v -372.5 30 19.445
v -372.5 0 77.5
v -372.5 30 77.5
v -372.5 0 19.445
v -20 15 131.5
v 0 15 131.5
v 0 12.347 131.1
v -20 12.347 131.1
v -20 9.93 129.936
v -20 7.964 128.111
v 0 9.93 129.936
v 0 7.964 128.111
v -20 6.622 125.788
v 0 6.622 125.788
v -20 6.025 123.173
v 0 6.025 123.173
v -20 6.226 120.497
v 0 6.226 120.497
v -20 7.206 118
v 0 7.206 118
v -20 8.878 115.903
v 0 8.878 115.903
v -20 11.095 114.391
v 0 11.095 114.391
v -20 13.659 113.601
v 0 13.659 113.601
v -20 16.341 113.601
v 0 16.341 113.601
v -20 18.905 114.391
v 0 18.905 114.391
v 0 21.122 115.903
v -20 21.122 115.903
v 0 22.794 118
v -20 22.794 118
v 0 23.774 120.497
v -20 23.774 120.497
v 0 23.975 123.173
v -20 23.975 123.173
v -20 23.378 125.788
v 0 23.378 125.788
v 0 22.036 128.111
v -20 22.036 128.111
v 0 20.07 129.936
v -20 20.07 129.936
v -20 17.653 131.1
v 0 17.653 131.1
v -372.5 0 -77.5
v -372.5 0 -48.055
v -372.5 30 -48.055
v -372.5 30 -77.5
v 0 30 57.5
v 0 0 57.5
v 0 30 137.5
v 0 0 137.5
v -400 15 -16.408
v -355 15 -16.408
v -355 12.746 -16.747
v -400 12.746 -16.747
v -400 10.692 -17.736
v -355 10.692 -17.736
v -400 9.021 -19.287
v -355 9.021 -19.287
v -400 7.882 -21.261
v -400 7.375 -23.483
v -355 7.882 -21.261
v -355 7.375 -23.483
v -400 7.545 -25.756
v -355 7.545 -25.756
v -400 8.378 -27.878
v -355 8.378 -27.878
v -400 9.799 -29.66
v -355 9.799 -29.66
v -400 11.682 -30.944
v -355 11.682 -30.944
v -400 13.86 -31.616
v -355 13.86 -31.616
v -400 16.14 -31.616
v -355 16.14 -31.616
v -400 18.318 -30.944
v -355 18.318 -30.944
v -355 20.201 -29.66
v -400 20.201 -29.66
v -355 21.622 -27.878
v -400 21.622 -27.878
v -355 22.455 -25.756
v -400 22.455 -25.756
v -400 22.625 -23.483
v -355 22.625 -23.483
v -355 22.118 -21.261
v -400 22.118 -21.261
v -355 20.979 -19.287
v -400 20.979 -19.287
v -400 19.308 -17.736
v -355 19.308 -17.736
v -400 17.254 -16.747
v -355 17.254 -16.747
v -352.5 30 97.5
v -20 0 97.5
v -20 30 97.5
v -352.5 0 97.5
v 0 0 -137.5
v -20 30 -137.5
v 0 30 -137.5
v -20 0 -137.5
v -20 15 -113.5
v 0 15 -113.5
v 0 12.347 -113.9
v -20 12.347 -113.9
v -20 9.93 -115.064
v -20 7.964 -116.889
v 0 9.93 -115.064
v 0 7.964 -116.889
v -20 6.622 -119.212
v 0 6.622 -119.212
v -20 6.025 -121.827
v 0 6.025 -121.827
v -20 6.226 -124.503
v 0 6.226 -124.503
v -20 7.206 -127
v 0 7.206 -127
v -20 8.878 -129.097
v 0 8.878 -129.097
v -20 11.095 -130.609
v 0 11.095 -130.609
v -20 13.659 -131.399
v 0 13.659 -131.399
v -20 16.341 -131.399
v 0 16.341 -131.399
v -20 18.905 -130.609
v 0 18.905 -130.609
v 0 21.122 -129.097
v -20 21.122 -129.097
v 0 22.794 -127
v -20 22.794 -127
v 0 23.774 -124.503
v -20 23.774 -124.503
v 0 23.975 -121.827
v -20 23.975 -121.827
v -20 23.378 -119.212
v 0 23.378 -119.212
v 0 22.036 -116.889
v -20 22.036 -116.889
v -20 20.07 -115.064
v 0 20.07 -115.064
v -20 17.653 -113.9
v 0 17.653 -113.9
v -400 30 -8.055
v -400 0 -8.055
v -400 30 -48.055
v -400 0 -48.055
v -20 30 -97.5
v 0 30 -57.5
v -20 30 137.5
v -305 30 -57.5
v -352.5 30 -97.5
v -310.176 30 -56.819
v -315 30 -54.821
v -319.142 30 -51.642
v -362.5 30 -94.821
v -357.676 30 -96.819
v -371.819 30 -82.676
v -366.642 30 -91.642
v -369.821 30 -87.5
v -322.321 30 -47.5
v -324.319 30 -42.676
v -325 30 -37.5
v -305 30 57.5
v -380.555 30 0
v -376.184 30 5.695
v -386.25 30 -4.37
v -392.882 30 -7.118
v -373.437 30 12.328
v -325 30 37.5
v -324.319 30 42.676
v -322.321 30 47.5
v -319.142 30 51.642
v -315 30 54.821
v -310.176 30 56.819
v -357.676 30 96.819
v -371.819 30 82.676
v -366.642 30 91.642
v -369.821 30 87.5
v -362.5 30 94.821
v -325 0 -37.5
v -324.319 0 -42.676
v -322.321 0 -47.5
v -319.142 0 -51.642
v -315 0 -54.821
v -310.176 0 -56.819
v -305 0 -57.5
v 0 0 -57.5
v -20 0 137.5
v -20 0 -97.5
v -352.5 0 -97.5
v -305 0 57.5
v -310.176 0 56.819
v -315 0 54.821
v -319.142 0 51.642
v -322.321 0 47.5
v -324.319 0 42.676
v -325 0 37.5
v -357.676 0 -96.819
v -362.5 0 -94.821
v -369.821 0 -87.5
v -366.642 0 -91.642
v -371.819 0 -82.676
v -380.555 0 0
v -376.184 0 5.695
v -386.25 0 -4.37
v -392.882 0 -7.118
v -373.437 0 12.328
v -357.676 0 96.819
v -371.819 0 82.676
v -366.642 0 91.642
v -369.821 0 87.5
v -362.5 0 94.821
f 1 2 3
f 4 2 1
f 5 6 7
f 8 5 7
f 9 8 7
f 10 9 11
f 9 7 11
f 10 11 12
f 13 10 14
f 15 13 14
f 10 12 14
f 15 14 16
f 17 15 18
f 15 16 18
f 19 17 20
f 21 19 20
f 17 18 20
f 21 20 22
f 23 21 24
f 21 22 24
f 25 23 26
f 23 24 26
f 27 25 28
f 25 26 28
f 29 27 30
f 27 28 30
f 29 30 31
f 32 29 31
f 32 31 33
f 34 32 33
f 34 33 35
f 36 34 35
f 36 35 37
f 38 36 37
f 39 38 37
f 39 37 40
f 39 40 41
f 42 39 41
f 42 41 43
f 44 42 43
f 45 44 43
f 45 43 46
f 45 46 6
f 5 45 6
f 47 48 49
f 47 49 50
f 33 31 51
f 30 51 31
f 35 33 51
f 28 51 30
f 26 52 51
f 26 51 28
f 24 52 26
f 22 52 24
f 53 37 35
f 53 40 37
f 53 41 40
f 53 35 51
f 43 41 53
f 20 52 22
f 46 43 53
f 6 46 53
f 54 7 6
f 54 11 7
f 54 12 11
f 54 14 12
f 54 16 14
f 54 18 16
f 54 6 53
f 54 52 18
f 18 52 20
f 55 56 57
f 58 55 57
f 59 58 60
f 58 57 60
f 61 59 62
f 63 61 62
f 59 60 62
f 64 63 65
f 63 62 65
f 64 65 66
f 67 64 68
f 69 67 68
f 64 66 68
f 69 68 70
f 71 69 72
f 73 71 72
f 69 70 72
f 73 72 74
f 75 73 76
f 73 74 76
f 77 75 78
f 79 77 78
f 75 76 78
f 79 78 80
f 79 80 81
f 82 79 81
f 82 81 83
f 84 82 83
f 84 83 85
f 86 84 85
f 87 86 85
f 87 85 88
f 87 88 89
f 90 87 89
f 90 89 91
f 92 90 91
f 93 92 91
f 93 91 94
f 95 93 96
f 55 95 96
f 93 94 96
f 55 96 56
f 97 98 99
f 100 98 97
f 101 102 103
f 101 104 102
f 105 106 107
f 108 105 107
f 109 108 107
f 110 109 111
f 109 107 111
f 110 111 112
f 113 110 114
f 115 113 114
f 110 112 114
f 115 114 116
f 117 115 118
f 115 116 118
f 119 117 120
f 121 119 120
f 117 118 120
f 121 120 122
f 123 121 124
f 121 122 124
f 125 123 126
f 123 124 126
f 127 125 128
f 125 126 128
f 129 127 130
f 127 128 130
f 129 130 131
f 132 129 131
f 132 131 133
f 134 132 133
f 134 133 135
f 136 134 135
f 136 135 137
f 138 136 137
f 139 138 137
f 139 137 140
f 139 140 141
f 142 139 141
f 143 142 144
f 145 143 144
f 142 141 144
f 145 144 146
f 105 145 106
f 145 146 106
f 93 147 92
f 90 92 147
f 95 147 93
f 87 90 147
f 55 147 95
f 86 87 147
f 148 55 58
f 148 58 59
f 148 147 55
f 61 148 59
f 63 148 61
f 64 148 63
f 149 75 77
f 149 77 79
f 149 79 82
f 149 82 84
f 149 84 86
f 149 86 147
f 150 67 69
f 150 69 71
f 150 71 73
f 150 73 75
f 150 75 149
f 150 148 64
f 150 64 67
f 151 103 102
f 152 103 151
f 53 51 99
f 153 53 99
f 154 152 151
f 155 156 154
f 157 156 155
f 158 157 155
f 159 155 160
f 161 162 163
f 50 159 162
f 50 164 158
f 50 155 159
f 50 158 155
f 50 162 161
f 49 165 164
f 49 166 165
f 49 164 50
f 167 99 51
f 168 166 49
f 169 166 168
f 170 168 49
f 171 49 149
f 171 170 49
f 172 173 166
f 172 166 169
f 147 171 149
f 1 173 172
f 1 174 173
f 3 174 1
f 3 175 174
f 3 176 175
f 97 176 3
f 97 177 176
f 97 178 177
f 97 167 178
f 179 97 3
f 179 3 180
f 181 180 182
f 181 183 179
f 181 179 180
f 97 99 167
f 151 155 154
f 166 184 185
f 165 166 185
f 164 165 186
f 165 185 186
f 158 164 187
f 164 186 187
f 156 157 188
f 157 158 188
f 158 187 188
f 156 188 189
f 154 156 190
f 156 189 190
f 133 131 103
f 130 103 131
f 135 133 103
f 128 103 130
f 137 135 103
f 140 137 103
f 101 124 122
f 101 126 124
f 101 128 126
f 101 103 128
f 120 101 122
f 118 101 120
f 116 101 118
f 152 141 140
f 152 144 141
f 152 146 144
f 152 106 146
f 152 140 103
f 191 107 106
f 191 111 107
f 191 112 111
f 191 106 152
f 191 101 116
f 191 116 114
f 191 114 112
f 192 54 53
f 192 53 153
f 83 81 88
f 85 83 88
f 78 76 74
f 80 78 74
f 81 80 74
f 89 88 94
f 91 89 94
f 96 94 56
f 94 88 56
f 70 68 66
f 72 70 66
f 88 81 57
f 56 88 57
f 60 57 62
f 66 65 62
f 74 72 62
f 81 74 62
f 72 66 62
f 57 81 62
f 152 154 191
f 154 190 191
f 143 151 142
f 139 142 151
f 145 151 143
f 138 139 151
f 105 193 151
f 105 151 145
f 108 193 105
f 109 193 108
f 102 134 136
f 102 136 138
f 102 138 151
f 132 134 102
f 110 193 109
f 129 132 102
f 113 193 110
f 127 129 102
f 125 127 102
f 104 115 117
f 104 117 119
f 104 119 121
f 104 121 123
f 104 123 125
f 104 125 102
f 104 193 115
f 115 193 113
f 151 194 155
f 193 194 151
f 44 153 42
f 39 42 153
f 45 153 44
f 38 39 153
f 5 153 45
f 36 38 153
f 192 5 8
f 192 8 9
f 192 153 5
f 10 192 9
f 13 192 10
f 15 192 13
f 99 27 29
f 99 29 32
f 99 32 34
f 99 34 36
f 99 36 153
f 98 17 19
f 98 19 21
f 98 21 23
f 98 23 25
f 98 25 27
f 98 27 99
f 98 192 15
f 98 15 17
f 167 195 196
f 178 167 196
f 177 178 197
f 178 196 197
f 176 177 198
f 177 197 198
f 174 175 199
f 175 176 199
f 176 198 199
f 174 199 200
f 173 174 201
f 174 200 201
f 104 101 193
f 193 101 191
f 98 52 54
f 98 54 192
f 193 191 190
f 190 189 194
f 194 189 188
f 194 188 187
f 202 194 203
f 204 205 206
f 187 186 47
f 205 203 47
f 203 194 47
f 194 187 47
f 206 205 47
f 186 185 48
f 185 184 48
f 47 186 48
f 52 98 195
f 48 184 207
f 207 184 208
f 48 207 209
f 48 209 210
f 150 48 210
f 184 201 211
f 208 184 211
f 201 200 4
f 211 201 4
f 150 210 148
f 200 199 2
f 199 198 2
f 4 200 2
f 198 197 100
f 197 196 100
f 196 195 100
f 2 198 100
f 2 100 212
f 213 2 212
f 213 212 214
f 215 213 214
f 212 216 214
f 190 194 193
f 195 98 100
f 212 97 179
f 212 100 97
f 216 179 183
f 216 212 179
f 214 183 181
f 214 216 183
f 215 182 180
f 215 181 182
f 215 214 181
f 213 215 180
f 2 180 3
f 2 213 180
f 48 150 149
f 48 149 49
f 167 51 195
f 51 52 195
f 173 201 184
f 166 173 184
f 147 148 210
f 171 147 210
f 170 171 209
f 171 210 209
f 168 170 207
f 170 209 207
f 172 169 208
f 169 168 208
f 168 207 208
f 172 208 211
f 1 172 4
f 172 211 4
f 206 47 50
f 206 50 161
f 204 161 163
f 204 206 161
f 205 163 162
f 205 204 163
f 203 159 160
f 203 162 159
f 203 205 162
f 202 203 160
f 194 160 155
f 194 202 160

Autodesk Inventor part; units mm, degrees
ref_plane "YZ Plane" through (0, 0, 0) normal (1, 0, 0) x (0, 1, 0)
ref_plane "XZ Plane" through (0, 0, 0) normal (0, 1, 0) x (-1, 0, 0)
ref_plane "XY Plane" through (0, 0, 0) normal (0, 0, 1) x (1, 0, 0)
sketch "Skizze1" plane through (0, 0, 0) normal (0, 1, 0) x (-1, 0, 0)
  line L0 (0, 0) -> (380.5546, 0) construction
  line L1 (20, 97.5) -> (352.5, 97.5)
  line L2 (352.5, -97.5) -> (20, -97.5)
  line L3 (0, 76.1809) -> (0, 137.5)
  line L4 (0, 137.5) -> (20, 137.5)
  line L5 (20, 137.5) -> (20, 97.5)
  line L6 (20, -97.5) -> (20, -137.5)
  line L7 (20, -137.5) -> (0, -137.5)
  line L8 (0, -137.5) -> (0, -73.203)
  line L9 (400, -8.0546) -> (400, -8.0546)
  line L10 (400, -8.0546) -> (400, -48.0546)
  line L11 (400, -48.0546) -> (372.5, -48.0546)
  line L12 (0, 57.5) -> (305, 57.5)
  line L13 (325, 37.5) -> (325, -37.5)
  line L14 (305, -57.5) -> (0, -57.5)
  line L15 (0, -73.203) -> (0, -57.5)
  line L16 (0, 57.5) -> (0, 76.1809)
  line L17 (372.5, 77.5) -> (372.5, 19.4454)
  line L18 (372.5, -48.0546) -> (372.5, -77.5)
  arc A0 (372.5, 19.4454) -> (400, -8.0546) centre (400, 19.4454) ccw
  arc A1 (372.5, 77.5) -> (352.5, 97.5) centre (352.5, 77.5) ccw
  arc A2 (352.5, -97.5) -> (372.5, -77.5) centre (352.5, -77.5) ccw
  arc A3 (325, 37.5) -> (305, 57.5) centre (305, 37.5) ccw
  arc A4 (305, -57.5) -> (325, -37.5) centre (305, -37.5) ccw
  point P0 (372.5, 48.4727)
  dimension "d3" = 57.5
  dimension "d4" = 57.5
  dimension "d7" = 20
  dimension "d8" = 20
  dimension "d11" = 40
  dimension "d12" = 47.5
  dimension "d13" = 27.5
  dimension "d14" = 27.5
  dimension "d18" = 97.5
  dimension "d19" = 97.5
  dimension "d20" = 20
  dimension "d22" = 40
  dimension "d24" = 305
  dimension "d45" = 40
  dimension "d46" = 40
  dimension "d47" = 40
extrude "Extrusion1" add sketch "Skizze1" along normal blind 30
sketch "Skizze2" plane through (-400, 0, -48.0546) normal (-1, 0, 0) x (0, 0, 1)
  line L0 (0, 0) -> (0, 30) projected
  line L1 (0, 0) -> (40, 0) projected
  point P0 (48.0546, 0)
  point P1 (24, 15)
  point P2 (0, 15)
  dimension "d34" = 24
hole "Bohrung1" at (-400, 15, -24.0546) direction (1, 0, 0) diameter 15.2937 depth 45 thread size "M18x2.5" class "6H" standard "ISO Metric profile"
sketch "Skizze3" plane through (-20, 0, 97.5) normal (-1, 0, 0) x (0, 0, 1)
  line L0 (40, 0) -> (40, 30) projected
  line L1 (-235, 0) -> (-235, 30) projected
  point P0 (-97.5, 0)
  point P1 (25, 15)
  point P2 (-220, 15)
  point P3 (40, 15)
  point P4 (-235, 15)
  dimension "d43" = 15
  dimension "d44" = 15
hole "Bohrung2" at (-20, 15, 122.5) at (-20, 15, -122.5) direction (1, 0, 0) diameter 18 depth 20
equation "\"d4\" = d3"
equation "\"d8\" = d7"
equation "\"d46\" = d45"
equation "\"d47\" = d22"
properties part number "2" material "Kupfer, Legierung"
